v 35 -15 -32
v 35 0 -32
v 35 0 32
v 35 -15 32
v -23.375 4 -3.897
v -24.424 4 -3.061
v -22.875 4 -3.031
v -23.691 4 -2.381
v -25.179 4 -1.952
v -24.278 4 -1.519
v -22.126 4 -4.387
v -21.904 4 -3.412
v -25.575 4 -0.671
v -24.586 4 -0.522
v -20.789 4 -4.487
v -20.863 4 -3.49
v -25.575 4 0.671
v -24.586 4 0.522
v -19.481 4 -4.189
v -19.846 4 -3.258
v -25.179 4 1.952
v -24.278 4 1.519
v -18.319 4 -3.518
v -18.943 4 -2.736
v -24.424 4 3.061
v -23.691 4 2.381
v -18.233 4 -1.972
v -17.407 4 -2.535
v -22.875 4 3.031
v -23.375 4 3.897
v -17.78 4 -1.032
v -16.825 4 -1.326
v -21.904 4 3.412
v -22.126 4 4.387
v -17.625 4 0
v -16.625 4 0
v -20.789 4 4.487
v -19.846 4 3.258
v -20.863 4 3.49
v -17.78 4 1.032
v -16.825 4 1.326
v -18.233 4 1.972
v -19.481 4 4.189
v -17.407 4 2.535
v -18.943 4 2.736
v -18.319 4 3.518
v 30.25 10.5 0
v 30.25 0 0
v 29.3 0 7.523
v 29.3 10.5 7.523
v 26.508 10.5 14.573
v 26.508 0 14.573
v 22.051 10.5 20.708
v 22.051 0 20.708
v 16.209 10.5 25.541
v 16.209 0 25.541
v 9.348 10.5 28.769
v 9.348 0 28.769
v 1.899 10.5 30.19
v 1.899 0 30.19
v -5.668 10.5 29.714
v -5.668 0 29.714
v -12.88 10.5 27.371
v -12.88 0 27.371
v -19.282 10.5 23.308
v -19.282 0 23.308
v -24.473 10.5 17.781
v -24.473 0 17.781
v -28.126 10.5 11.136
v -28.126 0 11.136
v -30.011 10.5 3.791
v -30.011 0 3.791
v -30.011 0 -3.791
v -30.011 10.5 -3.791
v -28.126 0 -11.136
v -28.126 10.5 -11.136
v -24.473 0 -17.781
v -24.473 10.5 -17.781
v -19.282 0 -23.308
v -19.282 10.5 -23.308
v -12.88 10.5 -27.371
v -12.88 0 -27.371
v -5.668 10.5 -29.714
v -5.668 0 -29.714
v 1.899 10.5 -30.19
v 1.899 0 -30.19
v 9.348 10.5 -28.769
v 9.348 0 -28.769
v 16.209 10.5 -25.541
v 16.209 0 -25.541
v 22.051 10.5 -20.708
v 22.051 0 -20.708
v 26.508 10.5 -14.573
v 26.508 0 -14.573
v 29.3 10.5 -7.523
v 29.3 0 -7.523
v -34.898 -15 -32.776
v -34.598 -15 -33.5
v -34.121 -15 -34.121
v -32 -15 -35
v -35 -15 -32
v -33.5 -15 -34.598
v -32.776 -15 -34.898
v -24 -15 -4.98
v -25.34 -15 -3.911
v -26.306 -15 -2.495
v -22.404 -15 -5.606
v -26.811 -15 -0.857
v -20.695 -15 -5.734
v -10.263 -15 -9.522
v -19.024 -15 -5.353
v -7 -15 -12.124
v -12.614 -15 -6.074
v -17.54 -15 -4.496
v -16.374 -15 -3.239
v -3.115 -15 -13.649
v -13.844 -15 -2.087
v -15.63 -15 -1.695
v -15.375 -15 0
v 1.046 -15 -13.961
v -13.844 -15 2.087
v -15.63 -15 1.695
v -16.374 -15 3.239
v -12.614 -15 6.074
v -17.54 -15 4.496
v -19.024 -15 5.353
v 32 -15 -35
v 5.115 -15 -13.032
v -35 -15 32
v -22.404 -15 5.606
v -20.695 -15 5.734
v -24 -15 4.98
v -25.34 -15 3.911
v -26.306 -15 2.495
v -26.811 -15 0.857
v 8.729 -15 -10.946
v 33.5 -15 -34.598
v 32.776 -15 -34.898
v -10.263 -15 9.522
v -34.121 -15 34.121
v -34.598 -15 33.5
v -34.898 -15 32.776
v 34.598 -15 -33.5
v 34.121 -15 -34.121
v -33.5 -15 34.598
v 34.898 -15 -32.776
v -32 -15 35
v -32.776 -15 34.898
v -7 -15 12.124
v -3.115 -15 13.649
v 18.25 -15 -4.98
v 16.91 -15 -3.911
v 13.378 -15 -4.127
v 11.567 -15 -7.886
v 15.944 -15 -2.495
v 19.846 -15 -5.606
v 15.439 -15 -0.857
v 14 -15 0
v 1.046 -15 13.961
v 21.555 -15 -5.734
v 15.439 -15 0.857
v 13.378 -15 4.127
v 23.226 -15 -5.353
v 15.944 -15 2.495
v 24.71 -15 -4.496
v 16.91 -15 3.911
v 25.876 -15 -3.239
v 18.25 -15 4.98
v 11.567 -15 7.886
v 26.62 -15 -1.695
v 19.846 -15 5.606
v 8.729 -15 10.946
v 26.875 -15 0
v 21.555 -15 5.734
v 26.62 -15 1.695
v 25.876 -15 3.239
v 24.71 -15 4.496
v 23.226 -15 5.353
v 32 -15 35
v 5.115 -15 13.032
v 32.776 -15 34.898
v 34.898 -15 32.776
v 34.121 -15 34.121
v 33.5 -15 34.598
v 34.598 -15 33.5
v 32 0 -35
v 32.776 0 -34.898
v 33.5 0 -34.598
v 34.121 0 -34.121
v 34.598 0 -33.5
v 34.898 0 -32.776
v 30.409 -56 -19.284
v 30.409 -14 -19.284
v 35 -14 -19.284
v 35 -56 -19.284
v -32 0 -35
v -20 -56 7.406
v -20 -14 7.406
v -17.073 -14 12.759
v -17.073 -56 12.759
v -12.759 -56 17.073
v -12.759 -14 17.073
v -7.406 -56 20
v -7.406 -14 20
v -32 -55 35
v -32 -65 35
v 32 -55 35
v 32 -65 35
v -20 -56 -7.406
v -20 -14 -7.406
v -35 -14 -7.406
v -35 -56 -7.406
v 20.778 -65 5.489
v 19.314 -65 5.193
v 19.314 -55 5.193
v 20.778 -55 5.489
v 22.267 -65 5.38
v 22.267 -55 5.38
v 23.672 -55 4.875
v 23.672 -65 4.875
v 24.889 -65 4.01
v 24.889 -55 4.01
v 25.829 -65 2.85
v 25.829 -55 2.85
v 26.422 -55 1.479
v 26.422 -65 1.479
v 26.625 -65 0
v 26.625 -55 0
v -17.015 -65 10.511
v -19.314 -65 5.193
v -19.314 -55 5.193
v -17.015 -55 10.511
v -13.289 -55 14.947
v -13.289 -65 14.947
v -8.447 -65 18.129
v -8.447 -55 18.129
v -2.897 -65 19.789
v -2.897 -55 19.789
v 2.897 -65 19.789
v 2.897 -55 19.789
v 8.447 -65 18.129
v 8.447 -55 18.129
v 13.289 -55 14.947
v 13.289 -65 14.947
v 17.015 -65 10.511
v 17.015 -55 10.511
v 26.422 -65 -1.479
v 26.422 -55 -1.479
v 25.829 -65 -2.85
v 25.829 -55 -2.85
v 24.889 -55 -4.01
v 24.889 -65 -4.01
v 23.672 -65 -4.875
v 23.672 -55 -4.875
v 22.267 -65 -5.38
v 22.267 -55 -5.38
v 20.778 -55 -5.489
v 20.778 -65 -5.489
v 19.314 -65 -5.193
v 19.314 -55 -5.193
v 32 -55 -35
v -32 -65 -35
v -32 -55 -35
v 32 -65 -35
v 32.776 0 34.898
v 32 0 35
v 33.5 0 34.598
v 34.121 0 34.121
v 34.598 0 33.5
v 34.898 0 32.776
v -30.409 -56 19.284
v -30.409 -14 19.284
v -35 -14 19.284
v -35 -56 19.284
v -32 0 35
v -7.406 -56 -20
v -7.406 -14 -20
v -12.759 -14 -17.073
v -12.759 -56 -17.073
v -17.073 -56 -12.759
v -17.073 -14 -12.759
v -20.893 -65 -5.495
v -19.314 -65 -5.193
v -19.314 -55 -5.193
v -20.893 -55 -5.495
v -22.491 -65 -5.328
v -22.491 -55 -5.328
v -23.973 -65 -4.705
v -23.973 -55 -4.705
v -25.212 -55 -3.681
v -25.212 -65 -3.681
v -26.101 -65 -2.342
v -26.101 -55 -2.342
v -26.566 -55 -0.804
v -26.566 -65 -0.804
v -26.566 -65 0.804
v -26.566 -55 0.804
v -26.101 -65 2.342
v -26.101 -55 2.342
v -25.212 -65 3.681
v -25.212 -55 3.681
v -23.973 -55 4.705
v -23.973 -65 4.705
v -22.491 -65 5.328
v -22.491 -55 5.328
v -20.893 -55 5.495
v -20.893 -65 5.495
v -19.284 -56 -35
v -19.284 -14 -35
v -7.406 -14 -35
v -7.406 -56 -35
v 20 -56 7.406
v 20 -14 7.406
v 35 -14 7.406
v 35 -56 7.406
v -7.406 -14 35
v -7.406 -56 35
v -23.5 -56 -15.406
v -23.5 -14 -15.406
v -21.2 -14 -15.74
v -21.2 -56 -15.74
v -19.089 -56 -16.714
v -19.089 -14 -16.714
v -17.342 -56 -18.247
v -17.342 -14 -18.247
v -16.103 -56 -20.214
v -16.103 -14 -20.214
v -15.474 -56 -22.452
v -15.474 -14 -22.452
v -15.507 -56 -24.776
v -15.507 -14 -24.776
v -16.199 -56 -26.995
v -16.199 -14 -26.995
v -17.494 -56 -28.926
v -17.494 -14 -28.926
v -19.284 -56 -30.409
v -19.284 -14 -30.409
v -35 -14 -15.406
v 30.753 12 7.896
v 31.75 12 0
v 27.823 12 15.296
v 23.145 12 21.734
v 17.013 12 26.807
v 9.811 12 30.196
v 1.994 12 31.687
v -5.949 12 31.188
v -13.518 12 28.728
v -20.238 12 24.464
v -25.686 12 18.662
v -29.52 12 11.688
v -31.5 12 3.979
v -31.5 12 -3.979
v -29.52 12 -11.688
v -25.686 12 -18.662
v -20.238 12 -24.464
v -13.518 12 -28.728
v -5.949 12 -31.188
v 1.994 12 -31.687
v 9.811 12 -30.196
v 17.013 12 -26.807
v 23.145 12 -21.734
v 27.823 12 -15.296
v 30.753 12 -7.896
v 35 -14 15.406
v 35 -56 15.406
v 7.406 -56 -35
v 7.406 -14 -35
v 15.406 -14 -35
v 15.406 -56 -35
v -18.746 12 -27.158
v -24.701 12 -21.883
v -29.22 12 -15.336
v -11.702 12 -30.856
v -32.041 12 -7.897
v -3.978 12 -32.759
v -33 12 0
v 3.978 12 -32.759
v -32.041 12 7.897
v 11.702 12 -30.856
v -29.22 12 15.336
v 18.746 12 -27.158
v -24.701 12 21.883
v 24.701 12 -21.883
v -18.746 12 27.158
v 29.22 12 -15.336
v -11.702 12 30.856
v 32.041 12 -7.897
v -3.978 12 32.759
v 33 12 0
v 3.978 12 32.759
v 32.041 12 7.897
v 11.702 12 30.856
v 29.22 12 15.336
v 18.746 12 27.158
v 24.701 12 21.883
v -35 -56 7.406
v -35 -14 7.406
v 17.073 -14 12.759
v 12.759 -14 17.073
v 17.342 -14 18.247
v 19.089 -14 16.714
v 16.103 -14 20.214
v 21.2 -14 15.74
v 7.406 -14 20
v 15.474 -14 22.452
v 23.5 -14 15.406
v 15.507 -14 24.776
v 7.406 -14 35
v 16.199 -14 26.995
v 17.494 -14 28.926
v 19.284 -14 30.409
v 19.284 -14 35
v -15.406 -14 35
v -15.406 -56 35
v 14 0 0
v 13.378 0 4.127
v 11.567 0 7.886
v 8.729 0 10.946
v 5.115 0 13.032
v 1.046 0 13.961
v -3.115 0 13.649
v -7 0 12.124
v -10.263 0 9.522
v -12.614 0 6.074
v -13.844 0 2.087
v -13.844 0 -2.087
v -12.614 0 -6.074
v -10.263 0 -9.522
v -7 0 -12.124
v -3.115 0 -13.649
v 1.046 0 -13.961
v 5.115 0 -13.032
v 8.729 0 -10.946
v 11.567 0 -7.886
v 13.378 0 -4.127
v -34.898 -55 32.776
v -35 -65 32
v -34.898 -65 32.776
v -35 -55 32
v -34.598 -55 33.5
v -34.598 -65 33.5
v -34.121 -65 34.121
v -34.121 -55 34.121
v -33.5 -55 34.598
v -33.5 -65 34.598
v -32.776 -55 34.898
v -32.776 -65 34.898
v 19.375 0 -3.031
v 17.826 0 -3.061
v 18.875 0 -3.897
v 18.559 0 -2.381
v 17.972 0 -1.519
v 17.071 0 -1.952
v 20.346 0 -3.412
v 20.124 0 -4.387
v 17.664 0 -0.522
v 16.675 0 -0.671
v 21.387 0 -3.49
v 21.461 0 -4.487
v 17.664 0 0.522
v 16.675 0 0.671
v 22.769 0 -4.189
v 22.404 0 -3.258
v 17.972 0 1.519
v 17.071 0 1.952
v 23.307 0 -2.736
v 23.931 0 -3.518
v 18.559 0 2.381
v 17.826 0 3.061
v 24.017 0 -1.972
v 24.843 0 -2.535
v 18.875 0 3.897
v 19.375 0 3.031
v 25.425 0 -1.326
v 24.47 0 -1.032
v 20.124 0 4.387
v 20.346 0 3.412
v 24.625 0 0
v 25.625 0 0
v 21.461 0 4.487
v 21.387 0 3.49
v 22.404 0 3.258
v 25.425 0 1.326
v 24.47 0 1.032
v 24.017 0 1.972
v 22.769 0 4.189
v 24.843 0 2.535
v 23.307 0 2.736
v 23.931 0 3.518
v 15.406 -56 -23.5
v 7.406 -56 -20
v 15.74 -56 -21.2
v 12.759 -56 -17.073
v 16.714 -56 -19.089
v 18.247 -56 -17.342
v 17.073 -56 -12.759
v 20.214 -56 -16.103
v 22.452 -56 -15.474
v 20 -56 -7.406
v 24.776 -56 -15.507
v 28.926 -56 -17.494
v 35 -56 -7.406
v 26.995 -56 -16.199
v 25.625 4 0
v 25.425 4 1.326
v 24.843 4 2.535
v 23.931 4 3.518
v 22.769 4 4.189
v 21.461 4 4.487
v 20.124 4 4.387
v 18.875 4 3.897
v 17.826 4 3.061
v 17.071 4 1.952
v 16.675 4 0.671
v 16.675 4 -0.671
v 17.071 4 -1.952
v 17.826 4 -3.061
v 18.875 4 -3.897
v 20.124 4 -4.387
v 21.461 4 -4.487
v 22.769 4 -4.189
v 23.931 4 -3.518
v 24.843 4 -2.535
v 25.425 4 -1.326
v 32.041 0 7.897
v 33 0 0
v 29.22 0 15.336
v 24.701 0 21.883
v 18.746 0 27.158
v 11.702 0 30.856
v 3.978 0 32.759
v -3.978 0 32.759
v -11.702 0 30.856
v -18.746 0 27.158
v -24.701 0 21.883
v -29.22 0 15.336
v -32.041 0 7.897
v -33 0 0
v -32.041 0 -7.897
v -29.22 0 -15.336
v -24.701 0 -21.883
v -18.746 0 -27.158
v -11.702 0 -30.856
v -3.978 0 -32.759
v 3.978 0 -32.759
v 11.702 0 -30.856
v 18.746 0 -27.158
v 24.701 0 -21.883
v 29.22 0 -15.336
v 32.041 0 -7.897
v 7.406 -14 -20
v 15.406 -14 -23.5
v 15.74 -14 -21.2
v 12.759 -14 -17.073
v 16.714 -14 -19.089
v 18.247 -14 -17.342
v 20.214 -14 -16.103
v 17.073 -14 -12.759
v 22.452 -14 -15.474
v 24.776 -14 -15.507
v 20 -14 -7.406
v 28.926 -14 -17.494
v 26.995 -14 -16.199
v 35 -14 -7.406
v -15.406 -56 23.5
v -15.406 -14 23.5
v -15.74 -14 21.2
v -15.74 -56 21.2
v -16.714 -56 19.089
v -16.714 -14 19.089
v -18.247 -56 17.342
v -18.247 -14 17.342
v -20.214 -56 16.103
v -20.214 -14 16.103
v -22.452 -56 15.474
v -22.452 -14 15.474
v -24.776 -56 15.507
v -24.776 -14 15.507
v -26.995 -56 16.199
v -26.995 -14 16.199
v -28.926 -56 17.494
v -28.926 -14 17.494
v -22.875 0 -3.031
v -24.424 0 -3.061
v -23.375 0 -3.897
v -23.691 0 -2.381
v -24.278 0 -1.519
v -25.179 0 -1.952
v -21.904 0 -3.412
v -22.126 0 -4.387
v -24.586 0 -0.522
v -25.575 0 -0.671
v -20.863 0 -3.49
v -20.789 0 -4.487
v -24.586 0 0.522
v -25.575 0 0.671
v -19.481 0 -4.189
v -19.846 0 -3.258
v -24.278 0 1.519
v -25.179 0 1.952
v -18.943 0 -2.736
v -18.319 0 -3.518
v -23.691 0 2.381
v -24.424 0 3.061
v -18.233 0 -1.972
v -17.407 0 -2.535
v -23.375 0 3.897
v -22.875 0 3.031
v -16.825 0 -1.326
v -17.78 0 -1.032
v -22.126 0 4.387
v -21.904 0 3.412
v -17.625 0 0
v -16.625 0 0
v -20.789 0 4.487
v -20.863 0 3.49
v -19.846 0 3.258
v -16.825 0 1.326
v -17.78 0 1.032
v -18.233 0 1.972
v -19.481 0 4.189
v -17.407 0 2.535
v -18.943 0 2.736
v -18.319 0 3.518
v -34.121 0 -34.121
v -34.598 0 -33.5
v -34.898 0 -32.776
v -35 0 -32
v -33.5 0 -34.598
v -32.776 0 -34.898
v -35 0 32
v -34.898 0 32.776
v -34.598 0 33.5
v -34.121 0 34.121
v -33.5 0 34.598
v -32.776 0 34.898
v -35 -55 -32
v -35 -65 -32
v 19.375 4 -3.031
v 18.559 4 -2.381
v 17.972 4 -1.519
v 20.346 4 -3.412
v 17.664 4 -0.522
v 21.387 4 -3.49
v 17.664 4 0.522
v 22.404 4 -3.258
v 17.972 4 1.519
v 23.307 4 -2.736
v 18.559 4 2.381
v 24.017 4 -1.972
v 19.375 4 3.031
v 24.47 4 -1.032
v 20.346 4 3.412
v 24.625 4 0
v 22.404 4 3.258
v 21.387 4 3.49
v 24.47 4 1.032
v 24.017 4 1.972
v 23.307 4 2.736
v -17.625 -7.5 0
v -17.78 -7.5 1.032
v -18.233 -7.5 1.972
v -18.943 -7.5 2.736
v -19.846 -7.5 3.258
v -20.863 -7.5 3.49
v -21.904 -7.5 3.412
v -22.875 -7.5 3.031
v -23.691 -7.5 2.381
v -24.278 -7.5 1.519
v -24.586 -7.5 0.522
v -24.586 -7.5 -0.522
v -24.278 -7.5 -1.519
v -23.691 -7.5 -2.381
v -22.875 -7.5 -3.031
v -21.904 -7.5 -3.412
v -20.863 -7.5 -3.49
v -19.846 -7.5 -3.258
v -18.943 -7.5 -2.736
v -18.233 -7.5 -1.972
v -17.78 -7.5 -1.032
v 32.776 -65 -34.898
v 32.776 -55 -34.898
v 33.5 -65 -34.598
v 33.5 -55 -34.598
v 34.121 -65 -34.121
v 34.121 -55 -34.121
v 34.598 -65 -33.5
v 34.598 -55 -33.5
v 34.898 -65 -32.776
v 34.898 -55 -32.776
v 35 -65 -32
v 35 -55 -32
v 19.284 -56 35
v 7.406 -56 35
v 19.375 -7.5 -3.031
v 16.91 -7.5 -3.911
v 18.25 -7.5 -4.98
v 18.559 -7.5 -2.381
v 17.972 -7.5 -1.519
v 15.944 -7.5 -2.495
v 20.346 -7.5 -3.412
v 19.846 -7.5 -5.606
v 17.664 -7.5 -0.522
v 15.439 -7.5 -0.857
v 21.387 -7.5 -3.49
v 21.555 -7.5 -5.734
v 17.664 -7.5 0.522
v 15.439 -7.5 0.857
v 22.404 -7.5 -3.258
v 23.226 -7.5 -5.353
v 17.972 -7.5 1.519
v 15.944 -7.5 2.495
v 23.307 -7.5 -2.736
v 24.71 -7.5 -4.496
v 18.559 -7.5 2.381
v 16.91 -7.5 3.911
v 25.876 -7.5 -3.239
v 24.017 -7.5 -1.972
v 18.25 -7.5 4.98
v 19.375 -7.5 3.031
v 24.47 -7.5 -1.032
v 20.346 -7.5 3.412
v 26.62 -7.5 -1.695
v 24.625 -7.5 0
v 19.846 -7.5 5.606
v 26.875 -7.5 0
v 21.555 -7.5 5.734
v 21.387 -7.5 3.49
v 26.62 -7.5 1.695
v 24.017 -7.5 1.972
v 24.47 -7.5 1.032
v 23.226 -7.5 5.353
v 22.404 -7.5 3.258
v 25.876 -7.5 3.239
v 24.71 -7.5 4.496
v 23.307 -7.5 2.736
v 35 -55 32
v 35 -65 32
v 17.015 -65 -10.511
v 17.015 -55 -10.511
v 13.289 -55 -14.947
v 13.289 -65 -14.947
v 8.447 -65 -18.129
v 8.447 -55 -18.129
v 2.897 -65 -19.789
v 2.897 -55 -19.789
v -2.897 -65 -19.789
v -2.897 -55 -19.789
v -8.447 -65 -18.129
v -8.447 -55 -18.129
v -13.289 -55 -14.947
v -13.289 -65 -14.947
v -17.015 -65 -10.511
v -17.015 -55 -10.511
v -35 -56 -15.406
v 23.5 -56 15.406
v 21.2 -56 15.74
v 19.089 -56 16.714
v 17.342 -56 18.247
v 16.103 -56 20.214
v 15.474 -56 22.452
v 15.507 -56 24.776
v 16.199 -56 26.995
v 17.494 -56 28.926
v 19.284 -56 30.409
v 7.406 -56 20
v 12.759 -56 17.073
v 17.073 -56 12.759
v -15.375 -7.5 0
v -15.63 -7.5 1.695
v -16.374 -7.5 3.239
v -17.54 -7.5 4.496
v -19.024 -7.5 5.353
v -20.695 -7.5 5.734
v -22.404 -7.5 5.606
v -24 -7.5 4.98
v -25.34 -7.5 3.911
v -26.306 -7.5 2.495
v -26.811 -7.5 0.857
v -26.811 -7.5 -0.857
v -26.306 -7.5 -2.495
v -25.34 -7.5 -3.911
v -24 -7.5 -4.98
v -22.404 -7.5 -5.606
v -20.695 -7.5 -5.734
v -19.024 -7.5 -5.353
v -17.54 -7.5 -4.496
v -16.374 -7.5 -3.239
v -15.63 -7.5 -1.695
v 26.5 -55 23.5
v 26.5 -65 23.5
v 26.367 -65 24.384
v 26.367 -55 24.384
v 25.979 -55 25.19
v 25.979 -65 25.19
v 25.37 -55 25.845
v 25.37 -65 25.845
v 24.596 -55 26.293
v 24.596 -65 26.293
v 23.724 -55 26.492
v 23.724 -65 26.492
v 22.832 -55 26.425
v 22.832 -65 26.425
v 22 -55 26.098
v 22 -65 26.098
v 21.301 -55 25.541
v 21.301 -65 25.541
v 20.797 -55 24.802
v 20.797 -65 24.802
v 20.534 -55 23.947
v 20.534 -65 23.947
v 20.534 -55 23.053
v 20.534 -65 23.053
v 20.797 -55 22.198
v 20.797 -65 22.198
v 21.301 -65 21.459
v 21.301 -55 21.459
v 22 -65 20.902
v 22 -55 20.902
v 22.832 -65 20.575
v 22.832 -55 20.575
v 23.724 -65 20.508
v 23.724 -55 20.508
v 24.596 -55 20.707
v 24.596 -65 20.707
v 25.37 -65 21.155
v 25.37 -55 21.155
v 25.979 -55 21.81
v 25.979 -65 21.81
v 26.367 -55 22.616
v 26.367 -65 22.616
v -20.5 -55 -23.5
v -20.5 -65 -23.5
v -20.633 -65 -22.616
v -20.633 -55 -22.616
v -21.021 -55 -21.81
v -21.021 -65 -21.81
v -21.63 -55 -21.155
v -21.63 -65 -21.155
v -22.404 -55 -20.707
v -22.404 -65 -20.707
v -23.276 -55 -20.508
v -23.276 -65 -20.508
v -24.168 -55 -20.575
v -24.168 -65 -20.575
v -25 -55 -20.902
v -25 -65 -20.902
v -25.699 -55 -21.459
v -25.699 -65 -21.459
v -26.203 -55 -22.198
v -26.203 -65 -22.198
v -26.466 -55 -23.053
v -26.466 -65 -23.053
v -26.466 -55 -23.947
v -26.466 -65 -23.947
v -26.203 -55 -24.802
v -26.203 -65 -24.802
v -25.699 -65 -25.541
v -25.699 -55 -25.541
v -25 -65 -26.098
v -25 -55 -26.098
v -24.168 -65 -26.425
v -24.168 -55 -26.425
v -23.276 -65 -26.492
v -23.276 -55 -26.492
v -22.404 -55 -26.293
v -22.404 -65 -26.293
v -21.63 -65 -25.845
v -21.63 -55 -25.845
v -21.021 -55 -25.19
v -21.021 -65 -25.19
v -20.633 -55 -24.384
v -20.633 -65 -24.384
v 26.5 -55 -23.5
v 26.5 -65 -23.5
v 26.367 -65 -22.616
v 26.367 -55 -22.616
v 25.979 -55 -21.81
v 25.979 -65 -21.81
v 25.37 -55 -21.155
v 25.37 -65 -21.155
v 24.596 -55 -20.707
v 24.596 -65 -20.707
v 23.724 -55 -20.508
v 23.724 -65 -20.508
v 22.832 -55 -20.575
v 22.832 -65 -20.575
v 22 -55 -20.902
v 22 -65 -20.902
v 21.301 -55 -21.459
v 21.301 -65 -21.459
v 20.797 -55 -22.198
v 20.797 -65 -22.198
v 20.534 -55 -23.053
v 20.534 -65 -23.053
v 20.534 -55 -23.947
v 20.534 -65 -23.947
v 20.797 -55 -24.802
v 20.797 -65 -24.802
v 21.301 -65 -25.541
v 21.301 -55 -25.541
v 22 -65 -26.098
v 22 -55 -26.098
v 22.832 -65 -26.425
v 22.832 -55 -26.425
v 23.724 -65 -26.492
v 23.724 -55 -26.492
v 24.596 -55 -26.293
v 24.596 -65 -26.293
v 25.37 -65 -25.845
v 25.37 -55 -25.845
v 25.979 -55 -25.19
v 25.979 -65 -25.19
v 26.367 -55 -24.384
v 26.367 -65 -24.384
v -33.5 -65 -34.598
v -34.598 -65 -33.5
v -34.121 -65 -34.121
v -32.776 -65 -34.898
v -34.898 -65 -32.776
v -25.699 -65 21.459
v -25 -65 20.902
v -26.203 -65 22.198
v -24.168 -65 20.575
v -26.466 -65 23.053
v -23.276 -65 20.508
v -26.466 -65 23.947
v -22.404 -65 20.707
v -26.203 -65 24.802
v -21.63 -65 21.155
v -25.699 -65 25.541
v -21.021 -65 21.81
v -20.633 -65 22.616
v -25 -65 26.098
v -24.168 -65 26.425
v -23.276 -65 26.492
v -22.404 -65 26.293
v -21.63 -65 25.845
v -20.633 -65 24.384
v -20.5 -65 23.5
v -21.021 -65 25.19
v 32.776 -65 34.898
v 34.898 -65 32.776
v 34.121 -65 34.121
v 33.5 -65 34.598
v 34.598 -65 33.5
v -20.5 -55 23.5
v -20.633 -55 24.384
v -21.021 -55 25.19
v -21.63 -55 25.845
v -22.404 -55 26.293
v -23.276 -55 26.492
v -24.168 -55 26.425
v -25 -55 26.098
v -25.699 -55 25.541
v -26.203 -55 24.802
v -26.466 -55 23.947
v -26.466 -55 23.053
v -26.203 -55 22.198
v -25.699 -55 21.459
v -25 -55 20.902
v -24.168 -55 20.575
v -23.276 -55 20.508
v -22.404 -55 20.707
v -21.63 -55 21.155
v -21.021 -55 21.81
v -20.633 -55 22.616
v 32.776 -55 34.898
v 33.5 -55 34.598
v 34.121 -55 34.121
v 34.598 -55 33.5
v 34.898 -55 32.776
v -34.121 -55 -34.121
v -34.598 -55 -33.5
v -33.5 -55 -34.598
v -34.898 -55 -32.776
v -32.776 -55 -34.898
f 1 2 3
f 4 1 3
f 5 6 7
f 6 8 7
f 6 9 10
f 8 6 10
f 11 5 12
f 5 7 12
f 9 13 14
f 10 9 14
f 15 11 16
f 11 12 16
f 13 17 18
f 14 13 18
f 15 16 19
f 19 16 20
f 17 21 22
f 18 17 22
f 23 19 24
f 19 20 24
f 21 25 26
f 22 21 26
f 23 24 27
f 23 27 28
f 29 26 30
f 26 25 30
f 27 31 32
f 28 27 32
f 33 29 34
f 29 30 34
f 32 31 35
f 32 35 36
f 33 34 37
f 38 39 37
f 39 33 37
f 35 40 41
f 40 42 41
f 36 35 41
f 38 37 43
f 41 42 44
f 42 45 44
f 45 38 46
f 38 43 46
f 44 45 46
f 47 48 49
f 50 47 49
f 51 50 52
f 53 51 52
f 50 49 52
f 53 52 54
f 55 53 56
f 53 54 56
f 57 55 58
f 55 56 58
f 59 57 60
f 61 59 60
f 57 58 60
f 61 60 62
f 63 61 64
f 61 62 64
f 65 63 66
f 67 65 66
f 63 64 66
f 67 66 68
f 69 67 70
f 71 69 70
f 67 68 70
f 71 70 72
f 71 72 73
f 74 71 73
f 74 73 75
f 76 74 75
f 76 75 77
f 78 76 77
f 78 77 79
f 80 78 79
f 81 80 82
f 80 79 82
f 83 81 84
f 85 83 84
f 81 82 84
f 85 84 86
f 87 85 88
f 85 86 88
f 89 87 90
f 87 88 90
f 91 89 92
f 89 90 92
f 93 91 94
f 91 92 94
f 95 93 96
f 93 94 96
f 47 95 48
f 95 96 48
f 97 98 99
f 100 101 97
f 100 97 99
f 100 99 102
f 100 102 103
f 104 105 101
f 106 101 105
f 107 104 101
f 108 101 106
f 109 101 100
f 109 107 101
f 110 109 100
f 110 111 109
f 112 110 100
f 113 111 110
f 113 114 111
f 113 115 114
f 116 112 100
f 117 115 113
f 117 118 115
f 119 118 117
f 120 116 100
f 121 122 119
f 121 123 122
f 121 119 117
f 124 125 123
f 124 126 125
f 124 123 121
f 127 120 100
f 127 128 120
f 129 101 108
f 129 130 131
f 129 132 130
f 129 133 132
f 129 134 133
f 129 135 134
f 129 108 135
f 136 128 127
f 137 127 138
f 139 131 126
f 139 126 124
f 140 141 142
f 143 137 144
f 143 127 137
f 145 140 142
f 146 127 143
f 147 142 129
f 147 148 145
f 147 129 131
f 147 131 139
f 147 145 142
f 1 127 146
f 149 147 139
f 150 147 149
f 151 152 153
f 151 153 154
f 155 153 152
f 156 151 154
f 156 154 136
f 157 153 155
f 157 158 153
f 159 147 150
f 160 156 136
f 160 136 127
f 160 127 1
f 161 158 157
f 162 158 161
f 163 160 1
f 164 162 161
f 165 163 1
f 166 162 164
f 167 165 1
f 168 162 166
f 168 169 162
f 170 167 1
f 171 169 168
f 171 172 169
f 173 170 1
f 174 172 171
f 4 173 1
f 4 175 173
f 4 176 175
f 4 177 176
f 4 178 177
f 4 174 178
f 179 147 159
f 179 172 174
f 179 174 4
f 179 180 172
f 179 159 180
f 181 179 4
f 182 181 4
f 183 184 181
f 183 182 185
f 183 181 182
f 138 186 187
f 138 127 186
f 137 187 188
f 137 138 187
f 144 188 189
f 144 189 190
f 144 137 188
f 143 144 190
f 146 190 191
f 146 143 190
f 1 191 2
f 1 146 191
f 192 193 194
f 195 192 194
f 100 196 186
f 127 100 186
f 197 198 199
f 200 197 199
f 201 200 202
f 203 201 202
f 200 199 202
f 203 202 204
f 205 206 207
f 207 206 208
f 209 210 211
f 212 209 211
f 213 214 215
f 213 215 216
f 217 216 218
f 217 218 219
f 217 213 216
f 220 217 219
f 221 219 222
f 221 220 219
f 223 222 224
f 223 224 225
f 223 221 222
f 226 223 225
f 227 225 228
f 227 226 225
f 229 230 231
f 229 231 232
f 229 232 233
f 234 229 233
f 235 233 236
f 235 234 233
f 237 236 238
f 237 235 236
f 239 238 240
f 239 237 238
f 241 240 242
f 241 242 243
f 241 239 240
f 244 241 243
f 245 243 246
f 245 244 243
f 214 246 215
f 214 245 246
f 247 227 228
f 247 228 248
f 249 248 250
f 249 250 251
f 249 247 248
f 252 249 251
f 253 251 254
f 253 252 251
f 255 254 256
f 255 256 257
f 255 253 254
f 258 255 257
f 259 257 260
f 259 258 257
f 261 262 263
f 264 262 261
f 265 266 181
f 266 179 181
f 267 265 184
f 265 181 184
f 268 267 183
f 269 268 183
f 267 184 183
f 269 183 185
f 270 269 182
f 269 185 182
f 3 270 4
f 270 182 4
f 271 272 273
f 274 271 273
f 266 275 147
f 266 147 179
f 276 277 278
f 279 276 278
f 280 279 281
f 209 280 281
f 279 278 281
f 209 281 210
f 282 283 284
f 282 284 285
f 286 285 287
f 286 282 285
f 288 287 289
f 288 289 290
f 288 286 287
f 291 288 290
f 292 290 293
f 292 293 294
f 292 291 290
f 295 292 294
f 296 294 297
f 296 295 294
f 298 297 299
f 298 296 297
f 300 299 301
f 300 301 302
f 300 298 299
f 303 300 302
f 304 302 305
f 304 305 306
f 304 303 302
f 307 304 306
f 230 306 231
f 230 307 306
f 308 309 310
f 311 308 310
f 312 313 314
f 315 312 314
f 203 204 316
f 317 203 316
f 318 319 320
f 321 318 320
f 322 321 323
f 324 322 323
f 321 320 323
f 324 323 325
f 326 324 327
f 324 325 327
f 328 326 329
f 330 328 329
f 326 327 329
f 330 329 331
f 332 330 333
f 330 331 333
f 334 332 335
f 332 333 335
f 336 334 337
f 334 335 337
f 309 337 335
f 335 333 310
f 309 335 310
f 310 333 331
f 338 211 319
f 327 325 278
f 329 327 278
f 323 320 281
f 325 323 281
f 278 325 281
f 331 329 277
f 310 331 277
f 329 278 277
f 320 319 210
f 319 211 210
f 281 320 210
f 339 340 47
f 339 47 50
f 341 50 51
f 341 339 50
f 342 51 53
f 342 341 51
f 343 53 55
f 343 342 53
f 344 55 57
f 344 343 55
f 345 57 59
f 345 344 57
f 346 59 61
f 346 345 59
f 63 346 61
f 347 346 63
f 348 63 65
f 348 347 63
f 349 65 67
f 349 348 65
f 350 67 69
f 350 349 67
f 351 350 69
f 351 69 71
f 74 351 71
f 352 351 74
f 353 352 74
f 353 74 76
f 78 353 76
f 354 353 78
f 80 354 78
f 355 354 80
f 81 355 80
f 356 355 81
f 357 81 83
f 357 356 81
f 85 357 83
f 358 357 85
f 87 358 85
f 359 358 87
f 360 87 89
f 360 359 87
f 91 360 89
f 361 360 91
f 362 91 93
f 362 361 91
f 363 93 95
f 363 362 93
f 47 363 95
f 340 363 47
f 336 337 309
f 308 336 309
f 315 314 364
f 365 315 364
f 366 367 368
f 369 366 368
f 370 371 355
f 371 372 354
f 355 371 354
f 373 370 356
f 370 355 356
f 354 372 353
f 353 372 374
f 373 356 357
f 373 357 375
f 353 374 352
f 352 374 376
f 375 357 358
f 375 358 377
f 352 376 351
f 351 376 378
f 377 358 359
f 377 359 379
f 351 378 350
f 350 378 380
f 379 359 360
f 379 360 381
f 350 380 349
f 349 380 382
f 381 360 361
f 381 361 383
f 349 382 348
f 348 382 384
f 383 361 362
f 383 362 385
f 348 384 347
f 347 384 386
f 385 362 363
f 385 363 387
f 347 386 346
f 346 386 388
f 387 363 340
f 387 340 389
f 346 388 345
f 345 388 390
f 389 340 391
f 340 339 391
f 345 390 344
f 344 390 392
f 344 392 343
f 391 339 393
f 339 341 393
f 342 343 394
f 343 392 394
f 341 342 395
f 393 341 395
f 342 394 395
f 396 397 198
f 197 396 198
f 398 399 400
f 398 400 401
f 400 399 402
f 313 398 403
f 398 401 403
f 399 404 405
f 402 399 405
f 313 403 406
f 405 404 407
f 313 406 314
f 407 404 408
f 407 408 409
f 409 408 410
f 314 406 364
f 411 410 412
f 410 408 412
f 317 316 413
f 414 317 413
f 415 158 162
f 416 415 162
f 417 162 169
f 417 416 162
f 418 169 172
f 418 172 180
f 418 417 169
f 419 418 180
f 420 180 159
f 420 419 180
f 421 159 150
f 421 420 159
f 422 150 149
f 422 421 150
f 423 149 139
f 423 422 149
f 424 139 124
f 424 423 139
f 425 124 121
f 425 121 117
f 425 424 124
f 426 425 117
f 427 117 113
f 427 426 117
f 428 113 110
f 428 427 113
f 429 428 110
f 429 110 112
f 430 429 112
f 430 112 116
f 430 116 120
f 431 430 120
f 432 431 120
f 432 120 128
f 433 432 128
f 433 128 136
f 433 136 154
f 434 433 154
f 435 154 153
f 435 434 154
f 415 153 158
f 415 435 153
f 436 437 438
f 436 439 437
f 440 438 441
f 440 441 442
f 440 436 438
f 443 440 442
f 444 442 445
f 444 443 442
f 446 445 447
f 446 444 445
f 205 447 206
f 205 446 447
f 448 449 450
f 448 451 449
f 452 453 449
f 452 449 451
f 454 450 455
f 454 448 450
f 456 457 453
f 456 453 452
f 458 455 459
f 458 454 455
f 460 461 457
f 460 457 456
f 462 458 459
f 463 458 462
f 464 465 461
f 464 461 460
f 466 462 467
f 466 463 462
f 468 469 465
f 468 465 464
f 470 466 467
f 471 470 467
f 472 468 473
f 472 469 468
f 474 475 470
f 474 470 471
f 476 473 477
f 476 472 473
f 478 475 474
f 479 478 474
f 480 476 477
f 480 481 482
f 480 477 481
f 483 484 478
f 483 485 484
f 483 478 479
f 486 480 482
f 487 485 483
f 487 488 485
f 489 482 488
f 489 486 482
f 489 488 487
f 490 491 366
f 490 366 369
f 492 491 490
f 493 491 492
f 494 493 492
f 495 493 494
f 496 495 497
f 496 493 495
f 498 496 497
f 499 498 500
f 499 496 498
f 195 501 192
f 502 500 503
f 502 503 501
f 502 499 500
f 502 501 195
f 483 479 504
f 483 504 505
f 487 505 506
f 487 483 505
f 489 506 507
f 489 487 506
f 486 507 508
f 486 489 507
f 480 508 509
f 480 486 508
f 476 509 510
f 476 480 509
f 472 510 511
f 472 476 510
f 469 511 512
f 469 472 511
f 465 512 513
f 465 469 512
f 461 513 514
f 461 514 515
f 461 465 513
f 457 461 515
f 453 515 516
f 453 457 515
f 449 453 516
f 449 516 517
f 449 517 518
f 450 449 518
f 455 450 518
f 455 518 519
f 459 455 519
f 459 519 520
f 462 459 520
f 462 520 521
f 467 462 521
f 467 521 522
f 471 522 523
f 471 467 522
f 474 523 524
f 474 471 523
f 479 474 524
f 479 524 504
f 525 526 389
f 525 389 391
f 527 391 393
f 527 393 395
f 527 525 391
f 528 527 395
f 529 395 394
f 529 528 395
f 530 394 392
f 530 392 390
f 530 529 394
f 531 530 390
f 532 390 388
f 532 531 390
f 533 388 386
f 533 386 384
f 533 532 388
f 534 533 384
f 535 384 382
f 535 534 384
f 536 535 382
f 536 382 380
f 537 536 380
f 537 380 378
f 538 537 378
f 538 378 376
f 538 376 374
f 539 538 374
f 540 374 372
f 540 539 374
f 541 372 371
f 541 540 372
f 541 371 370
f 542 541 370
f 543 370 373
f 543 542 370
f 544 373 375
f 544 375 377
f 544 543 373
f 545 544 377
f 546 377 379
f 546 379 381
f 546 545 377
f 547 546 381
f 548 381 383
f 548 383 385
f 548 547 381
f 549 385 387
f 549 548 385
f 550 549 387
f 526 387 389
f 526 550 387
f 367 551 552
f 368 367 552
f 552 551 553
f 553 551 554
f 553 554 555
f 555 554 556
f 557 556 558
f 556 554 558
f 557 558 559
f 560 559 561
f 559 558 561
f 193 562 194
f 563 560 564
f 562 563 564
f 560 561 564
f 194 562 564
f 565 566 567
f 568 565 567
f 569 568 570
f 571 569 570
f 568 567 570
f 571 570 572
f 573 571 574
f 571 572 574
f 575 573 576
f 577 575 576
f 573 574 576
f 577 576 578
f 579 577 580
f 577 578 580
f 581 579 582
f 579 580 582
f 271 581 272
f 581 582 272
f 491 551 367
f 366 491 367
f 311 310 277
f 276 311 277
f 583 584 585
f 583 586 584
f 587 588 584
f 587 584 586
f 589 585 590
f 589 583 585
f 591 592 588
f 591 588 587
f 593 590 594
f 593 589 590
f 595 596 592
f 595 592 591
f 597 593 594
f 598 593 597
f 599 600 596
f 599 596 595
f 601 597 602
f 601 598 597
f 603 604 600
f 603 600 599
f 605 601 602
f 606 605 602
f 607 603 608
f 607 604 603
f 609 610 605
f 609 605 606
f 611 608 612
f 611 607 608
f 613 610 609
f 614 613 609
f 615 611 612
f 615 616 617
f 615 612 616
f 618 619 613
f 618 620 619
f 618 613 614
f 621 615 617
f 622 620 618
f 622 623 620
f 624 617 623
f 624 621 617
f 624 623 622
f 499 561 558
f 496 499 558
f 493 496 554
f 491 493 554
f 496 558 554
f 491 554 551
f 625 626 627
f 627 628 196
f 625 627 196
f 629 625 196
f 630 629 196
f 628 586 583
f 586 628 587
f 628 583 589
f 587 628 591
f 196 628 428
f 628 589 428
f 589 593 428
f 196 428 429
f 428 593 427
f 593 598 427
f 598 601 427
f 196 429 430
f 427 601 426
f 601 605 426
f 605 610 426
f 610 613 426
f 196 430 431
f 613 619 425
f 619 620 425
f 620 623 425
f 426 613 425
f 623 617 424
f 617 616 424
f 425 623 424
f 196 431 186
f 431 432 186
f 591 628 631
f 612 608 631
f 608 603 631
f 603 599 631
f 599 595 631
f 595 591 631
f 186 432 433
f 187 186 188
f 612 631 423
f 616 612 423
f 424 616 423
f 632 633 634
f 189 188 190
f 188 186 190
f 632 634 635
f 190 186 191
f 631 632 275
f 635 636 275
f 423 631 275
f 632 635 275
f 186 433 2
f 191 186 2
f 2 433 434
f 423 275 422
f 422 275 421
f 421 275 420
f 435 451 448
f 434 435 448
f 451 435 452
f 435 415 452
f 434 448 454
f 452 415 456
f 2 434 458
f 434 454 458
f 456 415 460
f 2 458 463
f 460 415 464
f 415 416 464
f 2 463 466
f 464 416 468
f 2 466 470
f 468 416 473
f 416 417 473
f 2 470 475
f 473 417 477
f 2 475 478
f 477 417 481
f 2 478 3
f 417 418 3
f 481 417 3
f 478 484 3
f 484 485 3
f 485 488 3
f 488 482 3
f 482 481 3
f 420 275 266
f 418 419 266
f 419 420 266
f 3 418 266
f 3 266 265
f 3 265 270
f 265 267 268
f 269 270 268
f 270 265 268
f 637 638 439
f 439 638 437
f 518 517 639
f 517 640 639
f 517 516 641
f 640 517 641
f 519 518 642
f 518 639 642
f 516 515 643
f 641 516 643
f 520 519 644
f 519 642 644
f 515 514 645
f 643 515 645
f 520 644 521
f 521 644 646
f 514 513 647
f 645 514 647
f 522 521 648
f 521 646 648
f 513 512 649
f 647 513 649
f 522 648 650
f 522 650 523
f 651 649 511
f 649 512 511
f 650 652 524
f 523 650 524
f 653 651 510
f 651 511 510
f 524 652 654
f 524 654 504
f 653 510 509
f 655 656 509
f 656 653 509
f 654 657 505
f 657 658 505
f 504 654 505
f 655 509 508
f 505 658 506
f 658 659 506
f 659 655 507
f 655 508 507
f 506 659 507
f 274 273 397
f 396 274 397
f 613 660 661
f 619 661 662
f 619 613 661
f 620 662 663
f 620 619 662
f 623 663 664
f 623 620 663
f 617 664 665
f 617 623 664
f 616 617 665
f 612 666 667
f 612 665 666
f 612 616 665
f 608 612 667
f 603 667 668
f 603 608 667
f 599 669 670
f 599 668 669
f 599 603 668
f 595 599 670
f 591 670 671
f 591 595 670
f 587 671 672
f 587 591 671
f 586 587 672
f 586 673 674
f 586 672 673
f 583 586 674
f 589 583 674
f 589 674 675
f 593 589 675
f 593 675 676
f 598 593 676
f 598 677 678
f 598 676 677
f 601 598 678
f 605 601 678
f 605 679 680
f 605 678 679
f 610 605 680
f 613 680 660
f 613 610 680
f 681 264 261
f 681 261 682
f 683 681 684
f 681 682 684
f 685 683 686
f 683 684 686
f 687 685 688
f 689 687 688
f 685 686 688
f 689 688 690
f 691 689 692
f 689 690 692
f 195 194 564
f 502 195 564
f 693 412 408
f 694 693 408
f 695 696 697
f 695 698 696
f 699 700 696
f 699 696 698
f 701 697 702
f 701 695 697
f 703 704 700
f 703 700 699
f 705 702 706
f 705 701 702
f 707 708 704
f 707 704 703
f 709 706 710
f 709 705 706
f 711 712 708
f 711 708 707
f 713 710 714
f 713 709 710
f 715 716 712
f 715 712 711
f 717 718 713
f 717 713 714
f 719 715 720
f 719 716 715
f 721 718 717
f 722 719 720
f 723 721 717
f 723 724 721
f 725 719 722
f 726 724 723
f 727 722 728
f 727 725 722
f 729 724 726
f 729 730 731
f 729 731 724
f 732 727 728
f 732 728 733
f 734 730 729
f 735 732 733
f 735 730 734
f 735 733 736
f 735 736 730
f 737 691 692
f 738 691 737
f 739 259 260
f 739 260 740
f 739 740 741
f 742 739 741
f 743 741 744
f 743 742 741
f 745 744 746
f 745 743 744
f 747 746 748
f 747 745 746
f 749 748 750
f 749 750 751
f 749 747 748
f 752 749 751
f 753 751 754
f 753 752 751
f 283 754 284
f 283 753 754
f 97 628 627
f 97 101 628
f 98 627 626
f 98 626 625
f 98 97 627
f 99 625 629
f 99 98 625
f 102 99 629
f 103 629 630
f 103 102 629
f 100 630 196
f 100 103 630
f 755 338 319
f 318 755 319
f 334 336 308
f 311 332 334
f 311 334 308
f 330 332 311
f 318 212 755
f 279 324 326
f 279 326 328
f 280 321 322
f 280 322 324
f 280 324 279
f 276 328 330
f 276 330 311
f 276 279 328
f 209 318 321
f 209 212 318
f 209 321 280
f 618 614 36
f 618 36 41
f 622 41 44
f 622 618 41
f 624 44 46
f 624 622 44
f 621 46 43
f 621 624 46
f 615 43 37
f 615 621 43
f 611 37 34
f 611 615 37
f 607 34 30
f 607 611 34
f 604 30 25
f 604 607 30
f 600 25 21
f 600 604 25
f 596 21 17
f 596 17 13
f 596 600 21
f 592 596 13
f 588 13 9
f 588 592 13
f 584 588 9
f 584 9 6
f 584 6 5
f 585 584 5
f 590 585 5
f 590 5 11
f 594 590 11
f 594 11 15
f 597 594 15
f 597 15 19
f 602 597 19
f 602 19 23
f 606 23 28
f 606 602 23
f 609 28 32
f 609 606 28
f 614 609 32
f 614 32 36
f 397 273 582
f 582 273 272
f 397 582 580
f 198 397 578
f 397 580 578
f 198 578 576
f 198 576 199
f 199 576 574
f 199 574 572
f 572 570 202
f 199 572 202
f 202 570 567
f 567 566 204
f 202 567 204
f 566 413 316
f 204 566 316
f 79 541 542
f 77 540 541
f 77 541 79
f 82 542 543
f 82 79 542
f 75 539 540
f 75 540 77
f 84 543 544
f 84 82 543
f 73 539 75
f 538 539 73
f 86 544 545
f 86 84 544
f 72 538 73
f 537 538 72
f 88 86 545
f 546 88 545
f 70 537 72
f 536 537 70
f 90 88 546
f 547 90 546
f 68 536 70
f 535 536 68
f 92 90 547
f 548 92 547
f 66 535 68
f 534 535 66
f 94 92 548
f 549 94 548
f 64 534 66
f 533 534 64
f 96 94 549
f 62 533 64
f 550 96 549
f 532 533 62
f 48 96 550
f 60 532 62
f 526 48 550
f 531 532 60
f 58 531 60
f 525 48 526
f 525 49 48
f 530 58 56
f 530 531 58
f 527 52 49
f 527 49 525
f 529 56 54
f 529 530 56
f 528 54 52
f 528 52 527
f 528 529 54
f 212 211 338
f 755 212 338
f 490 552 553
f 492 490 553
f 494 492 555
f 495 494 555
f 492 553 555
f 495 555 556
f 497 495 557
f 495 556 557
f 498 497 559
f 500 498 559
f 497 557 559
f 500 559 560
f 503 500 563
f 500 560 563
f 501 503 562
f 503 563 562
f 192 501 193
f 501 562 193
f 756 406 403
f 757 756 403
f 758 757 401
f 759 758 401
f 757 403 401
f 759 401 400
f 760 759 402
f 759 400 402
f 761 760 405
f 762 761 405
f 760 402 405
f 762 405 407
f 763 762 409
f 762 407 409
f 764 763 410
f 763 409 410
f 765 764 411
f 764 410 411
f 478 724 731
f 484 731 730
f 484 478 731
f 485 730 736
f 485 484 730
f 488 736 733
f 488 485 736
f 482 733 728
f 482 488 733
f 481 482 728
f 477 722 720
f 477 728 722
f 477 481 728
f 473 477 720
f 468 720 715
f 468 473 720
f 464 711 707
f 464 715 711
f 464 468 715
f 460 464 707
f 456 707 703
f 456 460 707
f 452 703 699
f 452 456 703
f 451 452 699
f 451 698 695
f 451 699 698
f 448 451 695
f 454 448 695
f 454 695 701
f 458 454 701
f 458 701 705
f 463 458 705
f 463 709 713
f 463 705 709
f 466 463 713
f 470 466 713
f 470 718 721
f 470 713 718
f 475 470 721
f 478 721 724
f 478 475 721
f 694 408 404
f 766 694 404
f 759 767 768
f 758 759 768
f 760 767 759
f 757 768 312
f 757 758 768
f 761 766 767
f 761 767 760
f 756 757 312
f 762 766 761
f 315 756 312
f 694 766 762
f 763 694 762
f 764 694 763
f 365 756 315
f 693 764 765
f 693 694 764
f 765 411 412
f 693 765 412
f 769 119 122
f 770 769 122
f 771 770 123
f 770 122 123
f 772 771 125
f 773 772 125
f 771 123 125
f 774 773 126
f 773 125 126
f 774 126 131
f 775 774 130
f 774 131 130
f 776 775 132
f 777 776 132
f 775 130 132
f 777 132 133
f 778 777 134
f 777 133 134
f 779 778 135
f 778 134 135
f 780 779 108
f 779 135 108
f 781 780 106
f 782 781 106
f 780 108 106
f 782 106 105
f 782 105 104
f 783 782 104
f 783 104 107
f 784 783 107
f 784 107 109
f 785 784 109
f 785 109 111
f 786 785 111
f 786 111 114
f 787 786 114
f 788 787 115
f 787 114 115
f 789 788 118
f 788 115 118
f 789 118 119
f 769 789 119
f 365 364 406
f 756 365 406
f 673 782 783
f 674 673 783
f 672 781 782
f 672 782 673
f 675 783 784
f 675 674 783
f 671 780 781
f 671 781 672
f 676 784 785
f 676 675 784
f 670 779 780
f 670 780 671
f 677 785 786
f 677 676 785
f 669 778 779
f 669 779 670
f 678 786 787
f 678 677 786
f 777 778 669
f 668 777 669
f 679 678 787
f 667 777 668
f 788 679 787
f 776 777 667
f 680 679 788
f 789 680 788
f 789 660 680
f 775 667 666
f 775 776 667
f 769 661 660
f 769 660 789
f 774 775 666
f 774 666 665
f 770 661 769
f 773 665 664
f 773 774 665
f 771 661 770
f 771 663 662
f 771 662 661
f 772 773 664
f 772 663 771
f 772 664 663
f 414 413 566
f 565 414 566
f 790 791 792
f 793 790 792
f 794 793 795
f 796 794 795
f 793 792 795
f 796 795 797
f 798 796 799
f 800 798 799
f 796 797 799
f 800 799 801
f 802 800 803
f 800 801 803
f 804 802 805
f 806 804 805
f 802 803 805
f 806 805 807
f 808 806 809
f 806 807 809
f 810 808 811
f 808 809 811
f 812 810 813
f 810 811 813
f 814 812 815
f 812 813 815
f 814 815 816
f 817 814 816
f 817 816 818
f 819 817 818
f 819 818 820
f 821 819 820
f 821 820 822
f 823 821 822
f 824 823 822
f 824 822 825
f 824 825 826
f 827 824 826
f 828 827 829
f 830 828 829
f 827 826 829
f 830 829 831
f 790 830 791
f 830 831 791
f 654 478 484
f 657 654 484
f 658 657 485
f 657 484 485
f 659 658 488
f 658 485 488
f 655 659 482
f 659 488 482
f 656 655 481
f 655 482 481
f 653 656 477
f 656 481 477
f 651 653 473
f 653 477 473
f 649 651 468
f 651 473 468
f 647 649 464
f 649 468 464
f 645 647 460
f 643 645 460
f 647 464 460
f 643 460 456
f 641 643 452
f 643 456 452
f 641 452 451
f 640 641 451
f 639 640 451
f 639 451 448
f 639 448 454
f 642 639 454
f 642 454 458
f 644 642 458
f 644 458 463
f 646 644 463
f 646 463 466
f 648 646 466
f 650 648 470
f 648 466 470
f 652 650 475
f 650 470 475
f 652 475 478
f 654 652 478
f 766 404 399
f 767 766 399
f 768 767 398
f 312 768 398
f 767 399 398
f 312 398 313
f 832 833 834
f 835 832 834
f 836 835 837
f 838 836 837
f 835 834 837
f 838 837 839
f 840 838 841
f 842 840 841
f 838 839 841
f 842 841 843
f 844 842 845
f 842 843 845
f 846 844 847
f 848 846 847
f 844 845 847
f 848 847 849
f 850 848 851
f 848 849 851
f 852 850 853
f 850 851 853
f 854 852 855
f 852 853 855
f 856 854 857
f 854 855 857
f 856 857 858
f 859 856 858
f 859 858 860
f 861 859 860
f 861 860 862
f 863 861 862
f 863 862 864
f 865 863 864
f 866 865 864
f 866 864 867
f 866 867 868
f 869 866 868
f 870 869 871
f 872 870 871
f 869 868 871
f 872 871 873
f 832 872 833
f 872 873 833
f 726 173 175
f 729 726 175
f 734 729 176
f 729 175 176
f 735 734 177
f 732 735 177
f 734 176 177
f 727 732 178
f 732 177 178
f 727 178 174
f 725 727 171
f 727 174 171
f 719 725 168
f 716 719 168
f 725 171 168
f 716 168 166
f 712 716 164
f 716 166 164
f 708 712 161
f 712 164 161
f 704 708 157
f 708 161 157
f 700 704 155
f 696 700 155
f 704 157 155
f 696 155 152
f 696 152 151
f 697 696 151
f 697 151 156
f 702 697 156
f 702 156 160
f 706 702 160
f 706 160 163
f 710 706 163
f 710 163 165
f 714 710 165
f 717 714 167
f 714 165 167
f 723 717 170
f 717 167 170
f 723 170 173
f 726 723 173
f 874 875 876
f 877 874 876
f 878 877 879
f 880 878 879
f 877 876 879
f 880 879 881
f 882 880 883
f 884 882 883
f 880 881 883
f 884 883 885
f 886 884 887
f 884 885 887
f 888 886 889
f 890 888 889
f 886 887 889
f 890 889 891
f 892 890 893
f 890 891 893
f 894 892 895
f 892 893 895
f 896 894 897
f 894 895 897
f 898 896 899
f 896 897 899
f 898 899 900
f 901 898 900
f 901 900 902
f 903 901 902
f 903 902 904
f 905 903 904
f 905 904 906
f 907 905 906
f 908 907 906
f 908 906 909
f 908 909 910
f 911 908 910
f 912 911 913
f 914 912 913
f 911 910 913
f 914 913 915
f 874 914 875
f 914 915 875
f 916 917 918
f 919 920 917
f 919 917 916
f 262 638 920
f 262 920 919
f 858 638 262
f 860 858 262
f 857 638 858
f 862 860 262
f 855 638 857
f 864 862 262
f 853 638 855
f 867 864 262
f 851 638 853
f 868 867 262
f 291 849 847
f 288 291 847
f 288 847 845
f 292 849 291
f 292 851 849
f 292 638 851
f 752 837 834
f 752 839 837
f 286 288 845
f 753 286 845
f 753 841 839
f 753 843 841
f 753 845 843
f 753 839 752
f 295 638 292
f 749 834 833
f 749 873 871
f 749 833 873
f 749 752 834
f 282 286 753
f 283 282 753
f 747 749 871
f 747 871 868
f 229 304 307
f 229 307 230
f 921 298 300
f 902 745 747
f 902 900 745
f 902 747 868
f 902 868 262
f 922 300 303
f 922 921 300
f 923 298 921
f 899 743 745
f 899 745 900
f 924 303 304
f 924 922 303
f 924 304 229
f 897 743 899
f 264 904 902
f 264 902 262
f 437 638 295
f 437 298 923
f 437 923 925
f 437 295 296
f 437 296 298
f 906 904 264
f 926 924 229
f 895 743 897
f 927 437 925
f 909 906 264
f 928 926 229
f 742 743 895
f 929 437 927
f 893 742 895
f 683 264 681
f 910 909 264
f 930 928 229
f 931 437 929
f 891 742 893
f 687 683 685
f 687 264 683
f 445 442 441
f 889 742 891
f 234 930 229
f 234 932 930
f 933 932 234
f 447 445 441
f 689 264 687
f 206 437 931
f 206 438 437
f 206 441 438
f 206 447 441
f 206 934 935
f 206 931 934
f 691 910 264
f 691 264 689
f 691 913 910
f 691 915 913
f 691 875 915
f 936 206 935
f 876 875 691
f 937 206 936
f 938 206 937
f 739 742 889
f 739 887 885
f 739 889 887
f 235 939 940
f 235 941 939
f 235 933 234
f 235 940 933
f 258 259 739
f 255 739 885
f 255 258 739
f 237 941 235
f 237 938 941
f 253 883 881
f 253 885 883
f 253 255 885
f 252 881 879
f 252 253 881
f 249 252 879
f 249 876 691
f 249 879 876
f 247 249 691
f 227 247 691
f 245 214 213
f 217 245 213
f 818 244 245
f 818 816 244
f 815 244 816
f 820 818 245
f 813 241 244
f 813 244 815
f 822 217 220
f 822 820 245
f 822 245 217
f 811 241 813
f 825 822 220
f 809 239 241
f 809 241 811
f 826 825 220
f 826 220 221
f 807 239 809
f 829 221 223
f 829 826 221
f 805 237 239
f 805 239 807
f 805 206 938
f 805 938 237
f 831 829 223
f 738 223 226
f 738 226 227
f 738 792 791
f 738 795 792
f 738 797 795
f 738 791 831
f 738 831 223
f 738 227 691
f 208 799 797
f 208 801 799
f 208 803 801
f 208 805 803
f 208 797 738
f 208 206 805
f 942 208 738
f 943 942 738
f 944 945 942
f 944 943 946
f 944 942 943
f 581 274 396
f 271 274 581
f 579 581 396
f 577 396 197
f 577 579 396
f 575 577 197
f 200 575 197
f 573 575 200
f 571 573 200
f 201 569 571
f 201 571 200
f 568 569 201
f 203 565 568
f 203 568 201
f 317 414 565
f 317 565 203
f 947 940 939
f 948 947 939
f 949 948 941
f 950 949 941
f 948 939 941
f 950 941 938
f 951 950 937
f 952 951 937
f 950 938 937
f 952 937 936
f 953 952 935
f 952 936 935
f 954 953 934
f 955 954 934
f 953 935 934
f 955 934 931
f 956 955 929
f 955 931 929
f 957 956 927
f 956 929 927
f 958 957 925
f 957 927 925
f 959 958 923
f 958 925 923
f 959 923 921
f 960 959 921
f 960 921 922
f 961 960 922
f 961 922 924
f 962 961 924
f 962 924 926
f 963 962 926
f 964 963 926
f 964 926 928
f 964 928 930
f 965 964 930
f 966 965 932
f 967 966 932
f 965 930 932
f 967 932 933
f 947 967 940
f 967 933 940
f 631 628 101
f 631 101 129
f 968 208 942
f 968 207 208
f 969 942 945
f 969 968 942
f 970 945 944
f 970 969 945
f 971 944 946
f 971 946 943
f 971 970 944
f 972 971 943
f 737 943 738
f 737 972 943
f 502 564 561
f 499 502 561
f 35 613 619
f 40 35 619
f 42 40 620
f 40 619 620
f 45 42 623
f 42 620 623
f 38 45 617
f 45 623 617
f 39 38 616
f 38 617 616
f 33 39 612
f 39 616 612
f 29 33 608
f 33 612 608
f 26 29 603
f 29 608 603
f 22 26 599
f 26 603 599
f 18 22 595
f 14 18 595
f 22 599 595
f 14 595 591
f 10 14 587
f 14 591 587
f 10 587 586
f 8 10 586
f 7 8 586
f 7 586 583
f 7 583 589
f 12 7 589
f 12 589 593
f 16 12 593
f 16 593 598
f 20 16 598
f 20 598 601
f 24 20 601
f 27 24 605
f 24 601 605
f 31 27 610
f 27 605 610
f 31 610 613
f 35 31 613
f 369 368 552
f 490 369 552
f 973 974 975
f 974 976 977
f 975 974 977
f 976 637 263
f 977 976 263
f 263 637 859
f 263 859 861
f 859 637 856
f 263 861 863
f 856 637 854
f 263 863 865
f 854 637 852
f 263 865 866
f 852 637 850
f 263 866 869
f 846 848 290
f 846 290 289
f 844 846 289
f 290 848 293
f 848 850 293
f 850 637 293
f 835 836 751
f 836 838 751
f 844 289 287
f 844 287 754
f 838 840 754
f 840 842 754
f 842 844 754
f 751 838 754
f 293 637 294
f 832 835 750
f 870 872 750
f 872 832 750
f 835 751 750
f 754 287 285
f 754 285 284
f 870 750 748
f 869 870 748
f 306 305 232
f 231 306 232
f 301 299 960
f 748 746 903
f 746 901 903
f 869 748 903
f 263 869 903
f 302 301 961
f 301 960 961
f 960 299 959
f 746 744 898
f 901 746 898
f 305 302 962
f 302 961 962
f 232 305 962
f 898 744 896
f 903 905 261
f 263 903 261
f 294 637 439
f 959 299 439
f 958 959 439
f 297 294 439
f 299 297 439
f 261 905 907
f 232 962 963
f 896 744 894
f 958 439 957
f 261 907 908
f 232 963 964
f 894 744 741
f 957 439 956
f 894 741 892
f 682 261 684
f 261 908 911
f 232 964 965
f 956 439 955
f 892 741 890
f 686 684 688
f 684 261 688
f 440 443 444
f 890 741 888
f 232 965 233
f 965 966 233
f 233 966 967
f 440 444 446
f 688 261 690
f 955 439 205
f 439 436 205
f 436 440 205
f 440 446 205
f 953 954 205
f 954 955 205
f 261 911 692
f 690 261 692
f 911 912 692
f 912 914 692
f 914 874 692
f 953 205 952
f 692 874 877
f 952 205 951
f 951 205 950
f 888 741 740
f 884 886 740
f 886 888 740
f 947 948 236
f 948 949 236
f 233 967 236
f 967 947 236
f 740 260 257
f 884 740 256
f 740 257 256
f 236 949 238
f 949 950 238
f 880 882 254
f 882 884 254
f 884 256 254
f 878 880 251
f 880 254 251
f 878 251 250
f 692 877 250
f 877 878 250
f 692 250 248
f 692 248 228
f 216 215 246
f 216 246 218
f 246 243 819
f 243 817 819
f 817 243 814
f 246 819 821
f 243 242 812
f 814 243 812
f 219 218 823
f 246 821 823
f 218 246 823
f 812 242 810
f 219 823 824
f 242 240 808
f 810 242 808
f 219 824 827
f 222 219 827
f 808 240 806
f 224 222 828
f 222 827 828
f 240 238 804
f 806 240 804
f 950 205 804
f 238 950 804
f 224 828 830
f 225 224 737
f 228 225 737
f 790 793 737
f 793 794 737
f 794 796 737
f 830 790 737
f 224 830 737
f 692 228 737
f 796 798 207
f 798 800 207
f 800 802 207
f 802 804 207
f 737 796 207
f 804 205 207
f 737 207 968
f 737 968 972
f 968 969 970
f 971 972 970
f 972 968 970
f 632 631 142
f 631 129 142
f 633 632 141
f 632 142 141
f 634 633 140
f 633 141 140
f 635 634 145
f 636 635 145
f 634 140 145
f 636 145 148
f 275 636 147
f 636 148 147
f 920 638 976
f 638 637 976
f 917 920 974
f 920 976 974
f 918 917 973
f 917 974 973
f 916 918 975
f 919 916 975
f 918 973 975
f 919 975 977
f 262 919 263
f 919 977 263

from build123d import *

# Parameters (mm, degrees)
F0_R      = 4.5
F0_R_2    = 3.5
F1_DEPTH  = 4
F2_R      = 33
F2_R_2    = 30.25
F3_DEPTH  = 12
F4_SIZE   = 1.5
F5_W      = 70
F5_H      = 70
F5_R      = 3.5
F5_R_2    = 14
F6_DEPTH  = 15
F8_R      = 5.75
F9_DEPTH  = 7.5
F11_W     = 70
F11_H     = 70
F11_R     = 3
F12_DEPTH = 10
F15_DEPTH = 42
F16_R     = 3
F17_R     = 3


with BuildPart() as f1:
    # F0 (on Front) → F1 (new body)
    with BuildSketch(Plane.XZ):
        with Locations((-21.125, 0)):
            Circle(F0_R)
        with Locations((-21.125, 0)):
            Circle(F0_R_2, mode=Mode.SUBTRACT)
        with Locations((21.125, 0)):
            Circle(F0_R)
        with Locations((21.125, 0)):
            Circle(F0_R_2, mode=Mode.SUBTRACT)
    extrude(amount=-F1_DEPTH)


with BuildPart() as f3:
    # F2 (on Front) → F3 (new body)
    with BuildSketch(Plane.XZ):
        Circle(F2_R)
        Circle(F2_R_2, mode=Mode.SUBTRACT)
    extrude(amount=-F3_DEPTH)

    # F4
    f4_edges = [f3.edges().sort_by_distance(p)[0] for p in [
        (-30.25, 12, 0),
    ]]
    chamfer(f4_edges, length=F4_SIZE)


with BuildPart() as f6:
    # F5 (on Front) → F6 (new body)
    with BuildSketch(Plane.XZ):
        Rectangle(F5_W, F5_H)
        with Locations((-21.125, 0)):
            Circle(F5_R, mode=Mode.SUBTRACT)
        Circle(F5_R_2, mode=Mode.SUBTRACT)
        with Locations((21.125, 0)):
            Circle(F5_R, mode=Mode.SUBTRACT)
    extrude(amount=F6_DEPTH)

    # F8 (on offset) → F9 (cut)
    with BuildSketch(Plane.XZ.offset(15)):
        with Locations((-21.125, 0)):
            Circle(F8_R)
        with Locations((21.125, 0)):
            Circle(F8_R)
    extrude(amount=-F9_DEPTH, mode=Mode.SUBTRACT)

    # F17
    f17_edges = [f6.edges().sort_by_distance(p)[0] for p in [
        (35, -7.5, -35),
        (35, -7.5, 35),
        (-35, -7.5, 35),
        (-35, -7.5, -35),
    ]]
    fillet(f17_edges, radius=F17_R)


with BuildPart() as f12:
    # F11 (on offset) → F12 (new body)
    with BuildSketch(Plane.XZ.offset(65)):
        Rectangle(F11_W, F11_H)
        with Locations((-23.5, -23.5)):
            Circle(F11_R, mode=Mode.SUBTRACT)
        with Locations((23.5, -23.5)):
            Circle(F11_R, mode=Mode.SUBTRACT)
        with Locations((-23.5, 23.5)):
            Circle(F11_R, mode=Mode.SUBTRACT)
        with BuildLine():
            ThreePointArc((-19.313979, 5.193285), (0, 20), (19.313979, 5.193285))
            ThreePointArc((19.313979, 5.193285), (24.310073, 4.483894), (26.625, 0))
            ThreePointArc((26.625, 0), (24.310073, -4.483894), (19.313979, -5.193285))
            ThreePointArc((19.313979, -5.193285), (0, -20), (-19.313979, -5.193285))
            ThreePointArc((-19.313979, -5.193285), (-26.625, 0), (-19.313979, 5.193285))
        make_face(mode=Mode.SUBTRACT)
        with Locations((23.5, 23.5)):
            Circle(F11_R, mode=Mode.SUBTRACT)
    extrude(amount=-F12_DEPTH)

    # F16
    f16_edges = [f12.edges().sort_by_distance(p)[0] for p in [
        (-35, -60, 35),
        (35, -60, 35),
        (35, -60, -35),
        (-35, -60, -35),
    ]]
    fillet(f16_edges, radius=F16_R)


with BuildPart() as f15:
    # F14 (on offset) → F15 (new body)
    with BuildSketch(Plane.XZ.offset(14)):
        with BuildLine():
            Line((-15.405996, 35), (-15.405996, 23.5))
            ThreePointArc((-15.405996, 23.5), (-21.310088, 15.707876), (-30.409, 19.283529))
            Line((-30.409, 19.283529), (-35, 19.283529))
            Line((-35, 19.283529), (-35.000031, 7.406))
            Line((-35.000031, 7.406), (-20.000031, 7.406))
            ThreePointArc((-20.000031, 7.406), (-15.069489, 15.06948), (-7.405996, 20))
            Line((-7.405996, 20), (-7.405996, 35))
            Line((-7.405996, 35), (-15.405996, 35))
        make_face()
        with BuildLine():
            Line((-20, -7.405996), (-35, -7.405996))
            Line((-35, -7.405996), (-35, -15.405996))
            Line((-35, -15.405996), (-23.5, -15.405996))
            ThreePointArc((-23.5, -15.405996), (-15.707876, -21.310088), (-19.283529, -30.409))
            Line((-19.283529, -30.409), (-19.283529, -35))
            Line((-19.283529, -35), (-7.406, -35.000031))
            Line((-7.406, -35.000031), (-7.406, -20.000031))
            ThreePointArc((-7.406, -20.000031), (-15.06948, -15.069489), (-20, -7.405996))
        make_face()
        with BuildLine():
            Line((7.405996, -20), (7.405996, -35))
            Line((7.405996, -35), (15.405996, -35))
            Line((15.405996, -35), (15.405996, -23.5))
            ThreePointArc((15.405996, -23.5), (21.310088, -15.707876), (30.409, -19.283529))
            Line((30.409, -19.283529), (35, -19.283529))
            Line((35, -19.283529), (35.000031, -7.406))
            Line((35.000031, -7.406), (20.000031, -7.406))
            ThreePointArc((20.000031, -7.406), (15.069489, -15.06948), (7.405996, -20))
        make_face()
        with BuildLine():
            Line((20, 7.405996), (35, 7.405996))
            Line((35, 7.405996), (35, 15.405996))
            Line((35, 15.405996), (23.5, 15.405996))
            ThreePointArc((23.5, 15.405996), (15.707876, 21.310088), (19.283529, 30.409))
            Line((19.283529, 30.409), (19.283529, 35))
            Line((19.283529, 35), (7.406, 35.000031))
            Line((7.406, 35.000031), (7.406, 20.000031))
            ThreePointArc((7.406, 20.000031), (15.06948, 15.069489), (20, 7.405996))
        make_face()
    extrude(amount=F15_DEPTH)


solid = Compound([f1.part, f3.part, f6.part, f12.part, f15.part])
